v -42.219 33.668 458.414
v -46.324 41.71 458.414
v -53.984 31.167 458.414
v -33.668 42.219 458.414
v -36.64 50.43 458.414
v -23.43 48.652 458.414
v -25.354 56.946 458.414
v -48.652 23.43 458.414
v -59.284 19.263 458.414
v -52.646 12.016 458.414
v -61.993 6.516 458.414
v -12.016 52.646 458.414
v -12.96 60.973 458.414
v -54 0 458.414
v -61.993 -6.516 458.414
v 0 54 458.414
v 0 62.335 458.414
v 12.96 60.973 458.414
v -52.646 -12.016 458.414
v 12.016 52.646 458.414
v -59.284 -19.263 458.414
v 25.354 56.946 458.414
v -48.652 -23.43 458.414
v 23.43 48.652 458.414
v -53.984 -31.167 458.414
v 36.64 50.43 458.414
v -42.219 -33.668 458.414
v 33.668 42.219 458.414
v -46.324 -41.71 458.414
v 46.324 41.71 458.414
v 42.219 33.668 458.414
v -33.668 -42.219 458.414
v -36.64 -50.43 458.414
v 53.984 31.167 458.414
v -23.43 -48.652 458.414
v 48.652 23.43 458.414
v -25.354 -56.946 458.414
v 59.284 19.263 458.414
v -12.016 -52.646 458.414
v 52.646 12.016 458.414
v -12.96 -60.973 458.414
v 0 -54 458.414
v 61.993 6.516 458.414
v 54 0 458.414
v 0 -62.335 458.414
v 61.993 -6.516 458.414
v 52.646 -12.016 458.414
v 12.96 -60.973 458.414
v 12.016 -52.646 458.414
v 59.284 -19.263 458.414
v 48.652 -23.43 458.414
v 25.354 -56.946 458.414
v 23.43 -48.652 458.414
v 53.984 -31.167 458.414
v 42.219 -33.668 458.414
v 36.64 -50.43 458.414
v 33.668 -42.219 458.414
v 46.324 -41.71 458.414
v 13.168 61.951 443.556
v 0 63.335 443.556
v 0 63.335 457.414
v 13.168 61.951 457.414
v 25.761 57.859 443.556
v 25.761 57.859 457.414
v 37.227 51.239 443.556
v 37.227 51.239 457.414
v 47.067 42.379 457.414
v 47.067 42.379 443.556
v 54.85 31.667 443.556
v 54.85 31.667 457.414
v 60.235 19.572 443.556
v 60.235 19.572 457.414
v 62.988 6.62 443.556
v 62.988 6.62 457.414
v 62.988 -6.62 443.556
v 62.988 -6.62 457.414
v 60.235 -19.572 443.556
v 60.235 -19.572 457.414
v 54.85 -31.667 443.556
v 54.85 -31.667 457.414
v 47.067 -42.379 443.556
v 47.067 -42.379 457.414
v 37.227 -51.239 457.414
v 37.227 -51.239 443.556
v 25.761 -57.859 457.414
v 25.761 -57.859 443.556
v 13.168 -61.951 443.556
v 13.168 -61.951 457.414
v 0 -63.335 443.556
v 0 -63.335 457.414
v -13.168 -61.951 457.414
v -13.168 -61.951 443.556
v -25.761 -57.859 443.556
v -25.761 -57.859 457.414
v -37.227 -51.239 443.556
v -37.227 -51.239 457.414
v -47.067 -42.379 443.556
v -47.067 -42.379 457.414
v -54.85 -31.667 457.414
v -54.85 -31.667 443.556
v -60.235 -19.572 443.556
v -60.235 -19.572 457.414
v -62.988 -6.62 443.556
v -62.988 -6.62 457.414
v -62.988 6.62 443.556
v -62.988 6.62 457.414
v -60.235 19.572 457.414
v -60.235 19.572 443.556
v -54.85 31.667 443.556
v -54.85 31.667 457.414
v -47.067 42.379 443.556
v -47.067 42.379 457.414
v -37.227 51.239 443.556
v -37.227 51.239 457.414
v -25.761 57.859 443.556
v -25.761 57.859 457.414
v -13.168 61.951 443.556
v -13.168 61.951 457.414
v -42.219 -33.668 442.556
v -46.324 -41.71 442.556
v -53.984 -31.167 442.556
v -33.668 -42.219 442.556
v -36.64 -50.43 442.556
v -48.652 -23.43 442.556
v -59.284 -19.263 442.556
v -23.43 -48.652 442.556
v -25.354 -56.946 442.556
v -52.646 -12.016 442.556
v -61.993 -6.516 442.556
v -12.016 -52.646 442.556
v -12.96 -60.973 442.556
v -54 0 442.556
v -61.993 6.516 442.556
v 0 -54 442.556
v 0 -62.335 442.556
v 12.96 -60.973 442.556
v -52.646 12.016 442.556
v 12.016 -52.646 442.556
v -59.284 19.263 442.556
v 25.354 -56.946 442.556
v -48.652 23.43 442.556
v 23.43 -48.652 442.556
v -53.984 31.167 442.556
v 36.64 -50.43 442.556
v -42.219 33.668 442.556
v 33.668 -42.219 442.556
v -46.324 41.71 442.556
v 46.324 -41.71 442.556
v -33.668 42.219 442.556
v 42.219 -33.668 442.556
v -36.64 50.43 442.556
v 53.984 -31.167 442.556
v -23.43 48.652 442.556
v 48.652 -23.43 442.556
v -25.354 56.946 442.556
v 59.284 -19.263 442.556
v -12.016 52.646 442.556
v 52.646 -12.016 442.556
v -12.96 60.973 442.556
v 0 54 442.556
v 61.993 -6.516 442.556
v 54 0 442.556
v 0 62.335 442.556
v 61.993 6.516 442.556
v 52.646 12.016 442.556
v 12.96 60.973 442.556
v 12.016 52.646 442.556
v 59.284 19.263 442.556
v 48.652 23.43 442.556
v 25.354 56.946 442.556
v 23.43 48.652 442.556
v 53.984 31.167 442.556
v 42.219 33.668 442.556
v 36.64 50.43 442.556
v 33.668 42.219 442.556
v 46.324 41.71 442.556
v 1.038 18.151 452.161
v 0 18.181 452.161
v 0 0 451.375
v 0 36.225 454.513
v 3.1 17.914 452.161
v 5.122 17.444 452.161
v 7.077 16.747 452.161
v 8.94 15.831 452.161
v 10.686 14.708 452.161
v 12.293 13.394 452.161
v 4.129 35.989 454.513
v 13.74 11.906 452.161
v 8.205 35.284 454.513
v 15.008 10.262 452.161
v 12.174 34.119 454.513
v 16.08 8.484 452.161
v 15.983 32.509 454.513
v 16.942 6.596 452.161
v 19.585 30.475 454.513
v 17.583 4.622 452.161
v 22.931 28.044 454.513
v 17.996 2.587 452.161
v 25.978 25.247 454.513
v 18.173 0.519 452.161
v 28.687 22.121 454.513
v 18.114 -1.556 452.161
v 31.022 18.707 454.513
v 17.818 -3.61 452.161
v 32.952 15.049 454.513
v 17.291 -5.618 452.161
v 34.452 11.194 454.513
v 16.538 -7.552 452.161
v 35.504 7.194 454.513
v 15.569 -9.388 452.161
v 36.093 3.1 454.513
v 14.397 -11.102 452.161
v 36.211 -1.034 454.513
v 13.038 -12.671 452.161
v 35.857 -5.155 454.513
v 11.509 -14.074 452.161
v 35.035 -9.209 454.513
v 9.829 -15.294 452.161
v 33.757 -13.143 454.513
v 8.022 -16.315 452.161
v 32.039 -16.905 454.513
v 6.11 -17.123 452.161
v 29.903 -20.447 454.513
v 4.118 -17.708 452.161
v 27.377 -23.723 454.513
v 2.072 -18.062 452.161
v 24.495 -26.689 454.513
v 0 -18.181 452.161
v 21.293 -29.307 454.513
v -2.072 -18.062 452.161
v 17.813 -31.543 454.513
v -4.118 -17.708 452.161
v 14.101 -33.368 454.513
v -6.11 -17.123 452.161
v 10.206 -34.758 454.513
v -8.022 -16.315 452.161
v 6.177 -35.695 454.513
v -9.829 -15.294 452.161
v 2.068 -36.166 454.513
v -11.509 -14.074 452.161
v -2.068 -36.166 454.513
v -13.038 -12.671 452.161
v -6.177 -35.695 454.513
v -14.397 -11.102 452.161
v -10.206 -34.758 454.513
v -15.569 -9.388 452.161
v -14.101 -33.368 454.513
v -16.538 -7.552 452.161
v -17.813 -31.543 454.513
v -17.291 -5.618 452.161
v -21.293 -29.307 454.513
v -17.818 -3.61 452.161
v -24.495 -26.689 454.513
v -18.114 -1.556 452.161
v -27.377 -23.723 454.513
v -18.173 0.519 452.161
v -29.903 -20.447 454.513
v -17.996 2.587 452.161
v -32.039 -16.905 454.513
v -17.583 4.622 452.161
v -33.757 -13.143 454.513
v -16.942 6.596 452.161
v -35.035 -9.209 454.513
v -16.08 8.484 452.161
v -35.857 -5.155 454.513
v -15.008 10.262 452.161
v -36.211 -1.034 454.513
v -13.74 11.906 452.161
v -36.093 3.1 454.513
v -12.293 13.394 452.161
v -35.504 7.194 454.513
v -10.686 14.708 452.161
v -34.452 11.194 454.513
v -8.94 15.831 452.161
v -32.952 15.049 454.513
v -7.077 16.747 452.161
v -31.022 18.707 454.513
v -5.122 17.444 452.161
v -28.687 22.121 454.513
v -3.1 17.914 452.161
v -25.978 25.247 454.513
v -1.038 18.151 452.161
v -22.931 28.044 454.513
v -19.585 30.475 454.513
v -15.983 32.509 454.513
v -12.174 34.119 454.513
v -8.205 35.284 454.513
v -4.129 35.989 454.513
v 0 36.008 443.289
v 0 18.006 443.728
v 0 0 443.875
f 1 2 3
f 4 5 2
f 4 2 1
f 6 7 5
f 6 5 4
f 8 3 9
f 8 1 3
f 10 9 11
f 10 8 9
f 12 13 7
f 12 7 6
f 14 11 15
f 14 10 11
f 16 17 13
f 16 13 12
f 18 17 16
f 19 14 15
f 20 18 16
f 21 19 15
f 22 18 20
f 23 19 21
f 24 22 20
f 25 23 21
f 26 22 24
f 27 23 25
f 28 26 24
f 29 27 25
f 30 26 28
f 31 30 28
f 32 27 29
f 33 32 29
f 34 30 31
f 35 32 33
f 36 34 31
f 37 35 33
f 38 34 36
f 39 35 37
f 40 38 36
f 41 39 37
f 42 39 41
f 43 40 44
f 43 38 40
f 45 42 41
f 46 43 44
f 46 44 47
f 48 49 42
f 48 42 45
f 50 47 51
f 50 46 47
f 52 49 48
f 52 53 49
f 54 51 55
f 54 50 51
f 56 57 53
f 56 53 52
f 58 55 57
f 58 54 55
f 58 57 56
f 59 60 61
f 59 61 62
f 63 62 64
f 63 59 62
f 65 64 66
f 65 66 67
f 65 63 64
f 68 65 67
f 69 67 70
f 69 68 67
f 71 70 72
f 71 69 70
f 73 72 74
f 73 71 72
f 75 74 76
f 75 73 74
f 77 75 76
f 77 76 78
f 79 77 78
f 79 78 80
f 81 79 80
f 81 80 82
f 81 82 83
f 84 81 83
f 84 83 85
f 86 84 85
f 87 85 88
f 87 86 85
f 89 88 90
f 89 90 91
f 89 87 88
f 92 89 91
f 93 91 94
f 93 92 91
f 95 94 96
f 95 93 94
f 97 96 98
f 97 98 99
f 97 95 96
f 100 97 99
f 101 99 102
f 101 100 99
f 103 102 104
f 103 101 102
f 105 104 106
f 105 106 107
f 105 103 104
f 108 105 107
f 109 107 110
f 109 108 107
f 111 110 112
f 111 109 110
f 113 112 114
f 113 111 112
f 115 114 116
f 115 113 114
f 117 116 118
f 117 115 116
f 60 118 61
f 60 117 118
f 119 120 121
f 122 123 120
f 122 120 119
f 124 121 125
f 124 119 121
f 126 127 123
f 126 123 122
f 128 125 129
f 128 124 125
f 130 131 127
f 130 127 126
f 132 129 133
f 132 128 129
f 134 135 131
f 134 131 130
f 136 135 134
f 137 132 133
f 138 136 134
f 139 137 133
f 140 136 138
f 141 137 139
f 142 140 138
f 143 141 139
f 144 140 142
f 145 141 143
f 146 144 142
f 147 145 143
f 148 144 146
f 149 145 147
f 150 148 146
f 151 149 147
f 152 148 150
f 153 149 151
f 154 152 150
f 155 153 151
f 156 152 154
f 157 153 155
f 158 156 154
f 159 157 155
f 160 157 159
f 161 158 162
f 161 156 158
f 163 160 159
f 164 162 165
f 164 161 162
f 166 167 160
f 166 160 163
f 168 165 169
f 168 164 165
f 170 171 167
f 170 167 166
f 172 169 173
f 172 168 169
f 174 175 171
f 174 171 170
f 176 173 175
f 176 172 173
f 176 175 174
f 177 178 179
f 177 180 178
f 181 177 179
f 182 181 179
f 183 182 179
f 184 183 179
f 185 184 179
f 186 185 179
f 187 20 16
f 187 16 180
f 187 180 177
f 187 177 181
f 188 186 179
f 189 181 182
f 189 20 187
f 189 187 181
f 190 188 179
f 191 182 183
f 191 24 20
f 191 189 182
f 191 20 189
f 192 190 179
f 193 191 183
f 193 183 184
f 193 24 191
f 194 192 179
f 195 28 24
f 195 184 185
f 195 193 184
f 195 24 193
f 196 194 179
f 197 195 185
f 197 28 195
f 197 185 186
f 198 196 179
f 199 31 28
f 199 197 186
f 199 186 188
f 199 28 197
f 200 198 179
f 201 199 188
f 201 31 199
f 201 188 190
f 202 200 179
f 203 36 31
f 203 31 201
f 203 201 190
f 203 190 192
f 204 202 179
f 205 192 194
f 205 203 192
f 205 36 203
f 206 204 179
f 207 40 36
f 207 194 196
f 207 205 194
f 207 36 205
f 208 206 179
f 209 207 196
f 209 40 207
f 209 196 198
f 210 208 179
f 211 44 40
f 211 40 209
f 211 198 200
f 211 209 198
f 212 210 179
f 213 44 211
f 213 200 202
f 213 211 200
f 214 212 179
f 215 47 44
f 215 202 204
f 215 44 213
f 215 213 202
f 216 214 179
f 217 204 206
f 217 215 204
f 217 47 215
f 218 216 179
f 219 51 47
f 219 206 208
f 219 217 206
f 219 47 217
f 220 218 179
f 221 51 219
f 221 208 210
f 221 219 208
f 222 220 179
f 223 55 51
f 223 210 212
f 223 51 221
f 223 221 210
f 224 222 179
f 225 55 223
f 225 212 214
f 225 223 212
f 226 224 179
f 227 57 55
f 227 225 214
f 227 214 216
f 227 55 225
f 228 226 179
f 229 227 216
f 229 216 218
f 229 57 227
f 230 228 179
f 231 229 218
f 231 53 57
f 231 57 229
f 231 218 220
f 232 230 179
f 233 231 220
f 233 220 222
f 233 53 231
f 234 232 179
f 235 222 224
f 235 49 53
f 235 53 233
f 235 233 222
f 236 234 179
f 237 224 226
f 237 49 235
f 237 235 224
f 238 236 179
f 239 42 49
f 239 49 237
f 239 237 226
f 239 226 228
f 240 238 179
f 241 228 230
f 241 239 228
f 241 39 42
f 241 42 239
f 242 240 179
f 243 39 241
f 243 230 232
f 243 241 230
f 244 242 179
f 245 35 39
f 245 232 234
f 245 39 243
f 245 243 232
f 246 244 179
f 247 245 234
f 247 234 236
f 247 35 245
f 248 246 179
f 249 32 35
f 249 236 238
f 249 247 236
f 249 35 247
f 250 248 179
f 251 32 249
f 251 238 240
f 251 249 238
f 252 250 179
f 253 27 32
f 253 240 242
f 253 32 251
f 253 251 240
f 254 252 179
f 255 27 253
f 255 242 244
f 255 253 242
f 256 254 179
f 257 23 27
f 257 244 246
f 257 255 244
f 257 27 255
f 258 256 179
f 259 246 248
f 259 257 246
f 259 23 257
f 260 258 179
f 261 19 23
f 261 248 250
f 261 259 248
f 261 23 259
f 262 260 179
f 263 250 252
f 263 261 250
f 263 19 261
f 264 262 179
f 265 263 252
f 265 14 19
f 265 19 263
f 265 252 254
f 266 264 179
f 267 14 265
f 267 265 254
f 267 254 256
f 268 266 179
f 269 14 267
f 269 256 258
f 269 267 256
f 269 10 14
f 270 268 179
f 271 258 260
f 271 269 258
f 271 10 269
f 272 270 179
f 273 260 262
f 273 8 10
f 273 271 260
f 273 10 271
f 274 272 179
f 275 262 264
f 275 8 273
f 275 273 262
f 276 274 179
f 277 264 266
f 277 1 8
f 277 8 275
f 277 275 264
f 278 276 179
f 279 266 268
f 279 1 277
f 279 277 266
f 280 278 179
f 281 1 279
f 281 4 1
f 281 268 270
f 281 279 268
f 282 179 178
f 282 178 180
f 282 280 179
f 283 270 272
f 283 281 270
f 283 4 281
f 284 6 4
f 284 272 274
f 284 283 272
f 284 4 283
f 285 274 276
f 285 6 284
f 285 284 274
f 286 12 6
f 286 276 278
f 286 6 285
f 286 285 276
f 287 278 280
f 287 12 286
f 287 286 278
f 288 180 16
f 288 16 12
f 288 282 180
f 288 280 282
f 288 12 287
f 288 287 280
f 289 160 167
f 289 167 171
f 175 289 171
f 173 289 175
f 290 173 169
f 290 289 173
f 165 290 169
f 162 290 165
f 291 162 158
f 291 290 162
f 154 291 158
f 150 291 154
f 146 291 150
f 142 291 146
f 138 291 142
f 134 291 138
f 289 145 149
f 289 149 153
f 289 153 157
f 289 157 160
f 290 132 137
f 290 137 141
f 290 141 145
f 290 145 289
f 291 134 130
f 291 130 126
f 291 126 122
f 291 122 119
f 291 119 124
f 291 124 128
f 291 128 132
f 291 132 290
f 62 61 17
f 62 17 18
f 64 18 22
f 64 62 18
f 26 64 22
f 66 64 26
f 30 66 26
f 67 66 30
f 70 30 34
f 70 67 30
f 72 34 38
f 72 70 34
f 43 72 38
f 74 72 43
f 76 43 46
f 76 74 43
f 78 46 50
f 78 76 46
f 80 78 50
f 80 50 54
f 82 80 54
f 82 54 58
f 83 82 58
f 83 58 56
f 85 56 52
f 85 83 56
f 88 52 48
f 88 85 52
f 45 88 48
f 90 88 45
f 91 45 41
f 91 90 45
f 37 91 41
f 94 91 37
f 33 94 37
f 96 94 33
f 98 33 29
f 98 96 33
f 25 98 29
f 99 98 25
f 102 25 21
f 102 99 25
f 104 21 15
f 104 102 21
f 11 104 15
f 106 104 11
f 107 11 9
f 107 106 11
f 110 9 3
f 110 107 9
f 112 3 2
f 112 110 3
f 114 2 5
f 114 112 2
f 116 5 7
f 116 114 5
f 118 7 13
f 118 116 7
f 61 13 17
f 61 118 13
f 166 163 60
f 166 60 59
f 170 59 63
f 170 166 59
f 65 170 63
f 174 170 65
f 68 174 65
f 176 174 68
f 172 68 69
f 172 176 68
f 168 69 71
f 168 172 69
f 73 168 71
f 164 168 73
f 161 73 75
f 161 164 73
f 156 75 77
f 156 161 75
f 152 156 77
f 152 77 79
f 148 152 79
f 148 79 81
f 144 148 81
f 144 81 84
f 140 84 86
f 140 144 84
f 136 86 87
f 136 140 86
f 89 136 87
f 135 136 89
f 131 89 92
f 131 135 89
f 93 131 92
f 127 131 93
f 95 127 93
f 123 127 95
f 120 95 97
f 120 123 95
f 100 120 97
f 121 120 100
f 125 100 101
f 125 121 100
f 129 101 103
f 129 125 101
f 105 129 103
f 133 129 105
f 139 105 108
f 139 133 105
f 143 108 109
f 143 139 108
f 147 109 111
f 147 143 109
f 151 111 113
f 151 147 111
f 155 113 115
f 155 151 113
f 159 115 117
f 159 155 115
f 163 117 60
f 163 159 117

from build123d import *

# Parameters (mm, degrees)
CHAMFER1_SIZE = 1


with BuildPart() as part:
    # Sketch1 → Revolve3 (revolve)
    with BuildSketch(Plane(origin=(0, 0, 0), x_dir=(0, 0, -1), z_dir=(1, 0, 0))):
        with BuildLine():
            Line((-458.414283312, 54), (-458.414283312, 63.3349))
            Line((-458.414283312, 63.3349), (-442.555821638, 63.3349))
            Line((-442.555821638, 63.3349), (-442.555821638, 54))
            ThreePointArc((-442.555821638, 54), (-443.54515622, 27.008055426), (-443.875, 0))
            Line((-443.875, 0), (-451.375, 0))
            ThreePointArc((-451.375, 0), (-453.142234121, 27.228438761), (-458.414283312, 54))
        make_face()
    revolve(axis=Axis((0, 0, 662.018), (0, 0, -1)))

    # Chamfer1
    chamfer1_edges = [part.edges().sort_by_distance(p)[0] for p in [
        (0, -63.3349, 442.555821638),
        (0, -63.3349, 458.414283312),
    ]]
    chamfer(chamfer1_edges, length=CHAMFER1_SIZE)


solid = part.part
